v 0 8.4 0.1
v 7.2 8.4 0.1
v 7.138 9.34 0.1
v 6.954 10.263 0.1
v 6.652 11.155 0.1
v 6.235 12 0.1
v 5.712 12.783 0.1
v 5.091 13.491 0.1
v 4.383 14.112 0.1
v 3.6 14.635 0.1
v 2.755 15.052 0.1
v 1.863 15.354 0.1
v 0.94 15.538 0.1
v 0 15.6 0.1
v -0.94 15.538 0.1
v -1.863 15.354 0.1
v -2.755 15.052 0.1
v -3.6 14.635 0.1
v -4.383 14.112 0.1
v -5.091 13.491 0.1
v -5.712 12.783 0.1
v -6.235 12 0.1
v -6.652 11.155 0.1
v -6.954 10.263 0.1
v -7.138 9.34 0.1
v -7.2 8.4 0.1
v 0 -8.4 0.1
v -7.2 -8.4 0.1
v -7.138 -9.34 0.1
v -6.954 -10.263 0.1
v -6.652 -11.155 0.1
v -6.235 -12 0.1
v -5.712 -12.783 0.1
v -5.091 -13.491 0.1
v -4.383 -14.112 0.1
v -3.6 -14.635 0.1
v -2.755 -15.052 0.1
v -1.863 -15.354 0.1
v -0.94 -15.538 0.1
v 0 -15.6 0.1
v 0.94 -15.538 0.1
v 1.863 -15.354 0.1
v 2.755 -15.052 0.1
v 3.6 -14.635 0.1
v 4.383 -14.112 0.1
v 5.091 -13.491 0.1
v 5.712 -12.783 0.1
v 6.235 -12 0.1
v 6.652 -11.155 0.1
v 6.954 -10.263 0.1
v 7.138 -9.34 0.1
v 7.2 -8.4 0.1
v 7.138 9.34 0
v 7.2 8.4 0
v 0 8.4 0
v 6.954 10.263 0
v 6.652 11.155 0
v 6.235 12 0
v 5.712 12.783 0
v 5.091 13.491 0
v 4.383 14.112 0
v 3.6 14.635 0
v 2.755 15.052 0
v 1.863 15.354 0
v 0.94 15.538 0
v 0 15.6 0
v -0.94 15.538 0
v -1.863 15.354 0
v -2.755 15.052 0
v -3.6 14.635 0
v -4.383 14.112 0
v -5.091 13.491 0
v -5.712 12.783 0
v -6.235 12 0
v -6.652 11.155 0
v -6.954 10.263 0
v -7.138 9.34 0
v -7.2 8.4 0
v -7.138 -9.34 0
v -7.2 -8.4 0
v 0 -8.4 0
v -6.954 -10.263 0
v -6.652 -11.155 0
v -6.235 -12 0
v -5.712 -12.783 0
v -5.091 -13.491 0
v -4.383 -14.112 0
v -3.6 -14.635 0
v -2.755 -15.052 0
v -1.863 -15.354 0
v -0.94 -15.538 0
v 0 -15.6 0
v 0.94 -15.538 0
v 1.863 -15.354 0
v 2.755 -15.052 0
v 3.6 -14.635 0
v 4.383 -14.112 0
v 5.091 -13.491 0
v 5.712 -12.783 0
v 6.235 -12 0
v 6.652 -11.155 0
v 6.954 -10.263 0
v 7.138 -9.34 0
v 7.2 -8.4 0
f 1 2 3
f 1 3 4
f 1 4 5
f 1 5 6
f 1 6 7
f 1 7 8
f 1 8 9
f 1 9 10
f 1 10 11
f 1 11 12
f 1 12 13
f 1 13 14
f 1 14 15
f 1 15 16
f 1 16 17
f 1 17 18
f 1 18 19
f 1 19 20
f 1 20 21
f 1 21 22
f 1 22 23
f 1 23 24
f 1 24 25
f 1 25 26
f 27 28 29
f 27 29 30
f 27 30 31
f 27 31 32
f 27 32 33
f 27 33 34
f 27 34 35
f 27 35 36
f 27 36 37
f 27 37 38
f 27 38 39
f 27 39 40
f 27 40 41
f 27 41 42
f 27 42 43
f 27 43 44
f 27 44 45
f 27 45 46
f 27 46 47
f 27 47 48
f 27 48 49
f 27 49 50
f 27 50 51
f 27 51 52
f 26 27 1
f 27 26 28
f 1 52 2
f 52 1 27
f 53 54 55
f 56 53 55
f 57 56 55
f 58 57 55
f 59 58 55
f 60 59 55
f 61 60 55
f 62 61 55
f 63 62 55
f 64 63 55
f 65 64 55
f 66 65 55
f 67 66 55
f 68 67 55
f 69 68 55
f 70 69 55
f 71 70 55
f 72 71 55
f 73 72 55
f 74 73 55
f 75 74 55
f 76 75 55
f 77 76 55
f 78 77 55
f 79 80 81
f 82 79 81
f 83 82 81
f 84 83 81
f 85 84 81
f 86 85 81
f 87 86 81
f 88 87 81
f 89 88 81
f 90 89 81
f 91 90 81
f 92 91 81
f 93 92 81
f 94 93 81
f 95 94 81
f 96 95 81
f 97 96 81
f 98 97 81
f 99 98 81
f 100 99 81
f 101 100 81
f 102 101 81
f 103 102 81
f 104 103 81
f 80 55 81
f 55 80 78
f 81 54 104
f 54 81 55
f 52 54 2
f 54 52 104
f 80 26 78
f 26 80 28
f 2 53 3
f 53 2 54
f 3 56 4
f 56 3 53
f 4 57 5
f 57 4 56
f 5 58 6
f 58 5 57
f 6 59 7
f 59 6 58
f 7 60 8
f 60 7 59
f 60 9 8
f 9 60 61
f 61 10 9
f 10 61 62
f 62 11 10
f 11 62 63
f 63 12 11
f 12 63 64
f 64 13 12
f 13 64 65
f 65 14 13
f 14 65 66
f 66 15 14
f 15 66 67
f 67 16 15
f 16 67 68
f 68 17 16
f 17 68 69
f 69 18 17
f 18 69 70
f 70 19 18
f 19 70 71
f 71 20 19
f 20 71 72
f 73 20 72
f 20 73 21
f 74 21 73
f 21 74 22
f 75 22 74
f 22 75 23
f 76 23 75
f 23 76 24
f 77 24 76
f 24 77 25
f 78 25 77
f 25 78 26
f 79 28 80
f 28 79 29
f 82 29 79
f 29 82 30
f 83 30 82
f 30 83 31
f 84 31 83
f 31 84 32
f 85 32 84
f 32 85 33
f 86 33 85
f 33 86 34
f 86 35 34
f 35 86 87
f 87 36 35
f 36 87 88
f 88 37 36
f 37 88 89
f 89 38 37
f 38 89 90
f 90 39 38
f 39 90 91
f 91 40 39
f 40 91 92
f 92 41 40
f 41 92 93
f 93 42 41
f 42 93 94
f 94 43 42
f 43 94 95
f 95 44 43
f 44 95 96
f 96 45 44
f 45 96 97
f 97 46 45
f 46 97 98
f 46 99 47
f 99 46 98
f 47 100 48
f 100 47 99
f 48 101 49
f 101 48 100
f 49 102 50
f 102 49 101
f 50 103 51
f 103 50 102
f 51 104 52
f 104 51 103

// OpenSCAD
// file: ../p/4-4edge.scad
use <../lib.scad>
$fa=1; $fs=0.2;
function ldraw_lib__4_4edge(realsolid=false) = [
// 0 Circle 1.0
// 0 Name: 4-4edge.dat
// 0 Author: James Jessiman
// 0 !LDRAW_ORG Primitive UPDATE 2017-01
// 0 !LICENSE Licensed under CC BY 2.0 and CC BY 4.0 : see CAreadme.txt
// 
// 0 BFC CERTIFY CCW
  [0,"BFC","CERTIFY"],
  [0,"BFC","CCW"],
// 
// 0 !HISTORY 1998-12-15 [PTadmin] Official Update 1998-10
// 0 !HISTORY 2005-12-28 [PTadmin] Official Update 2005-01
// 0 !HISTORY 2007-06-24 [PTadmin] Header formatted for Contributor Agreement
// 0 !HISTORY 2008-07-01 [PTadmin] Official Update 2008-01
// 0 !HISTORY 2017-01-15 [Steffen] BFCed
// 0 !HISTORY 2017-12-30 [PTadmin] Official Update 2017-01
// 
// 
// 2 24 1 0 0 0.9239 0 0.3827
  [2,24,1,0,0,0.9239,0,0.3827],
// 2 24 0.9239 0 0.3827 0.7071 0 0.7071
  [2,24,0.9239,0,0.3827,0.7071,0,0.7071],
// 2 24 0.7071 0 0.7071 0.3827 0 0.9239
  [2,24,0.7071,0,0.7071,0.3827,0,0.9239],
// 2 24 0.3827 0 0.9239 0 0 1
  [2,24,0.3827,0,0.9239,0,0,1],
// 2 24 0 0 1 -0.3827 0 0.9239
  [2,24,0,0,1,-0.3827,0,0.9239],
// 2 24 -0.3827 0 0.9239 -0.7071 0 0.7071
  [2,24,-0.3827,0,0.9239,-0.7071,0,0.7071],
// 2 24 -0.7071 0 0.7071 -0.9239 0 0.3827
  [2,24,-0.7071,0,0.7071,-0.9239,0,0.3827],
// 2 24 -0.9239 0 0.3827 -1 0 -0
  [2,24,-0.9239,0,0.3827,-1,0,-0],
// 2 24 -1 0 -0 -0.9239 0 -0.3827
  [2,24,-1,0,-0,-0.9239,0,-0.3827],
// 2 24 -0.9239 0 -0.3827 -0.7071 0 -0.7071
  [2,24,-0.9239,0,-0.3827,-0.7071,0,-0.7071],
// 2 24 -0.7071 0 -0.7071 -0.3827 0 -0.9239
  [2,24,-0.7071,0,-0.7071,-0.3827,0,-0.9239],
// 2 24 -0.3827 0 -0.9239 0 0 -1
  [2,24,-0.3827,0,-0.9239,0,0,-1],
// 2 24 0 0 -1 0.3827 0 -0.9239
  [2,24,0,0,-1,0.3827,0,-0.9239],
// 2 24 0.3827 0 -0.9239 0.7071 0 -0.7071
  [2,24,0.3827,0,-0.9239,0.7071,0,-0.7071],
// 2 24 0.7071 0 -0.7071 0.9239 0 -0.3827
  [2,24,0.7071,0,-0.7071,0.9239,0,-0.3827],
// 2 24 0.9239 0 -0.3827 1 0 0
  [2,24,0.9239,0,-0.3827,1,0,0],
];
module ldraw_lib__4_4edge(step=0, col=false, unit=2/5, alt=false, line=0.2, solid=!$preview)
    makepoly(ldraw_lib__4_4edge(solid), step=step, col=col, unit=unit, alt=alt, line=line, solid=solid);
ldraw_lib__4_4edge(line=0.2);
// file: ../p/4-4disc.scad
use <../lib.scad>
$fa=1; $fs=0.2;
function ldraw_lib__4_4disc(realsolid=false) = [
// 0 Disc 1.0
// 0 Name: 4-4disc.dat
// 0 Author: James Jessiman
// 0 !LDRAW_ORG Primitive UPDATE 2002-02
// 0 !LICENSE Licensed under CC BY 2.0 and CC BY 4.0 : see CAreadme.txt
// 
// 0 BFC CERTIFY CCW
  [0,"BFC","CERTIFY"],
  [0,"BFC","CCW"],
// 
// 0 !HISTORY 1998-12-15 [PTadmin] Official Update 1998-10
// 0 !HISTORY 2002-03-23 [sbliss] Added BFC statement
// 0 !HISTORY 2002-04-25 [PTadmin] Official Update 2002-02
// 0 !HISTORY 2007-06-24 [PTadmin] Header formatted for Contributor Agreement
// 0 !HISTORY 2008-07-01 [PTadmin] Official Update 2008-01
// 
// 
// 3 16 0 0 0 1 0 0 0.9239 0 0.3827
  [3,16,0,0,0,1,0,0,0.9239,0,0.3827],
// 3 16 0 0 0 0.9239 0 0.3827 0.7071 0 0.7071
  [3,16,0,0,0,0.9239,0,0.3827,0.7071,0,0.7071],
// 3 16 0 0 0 0.7071 0 0.7071 0.3827 0 0.9239
  [3,16,0,0,0,0.7071,0,0.7071,0.3827,0,0.9239],
// 3 16 0 0 0 0.3827 0 0.9239 0 0 1
  [3,16,0,0,0,0.3827,0,0.9239,0,0,1],
// 3 16 0 0 0 0 0 1 -0.3827 0 0.9239
  [3,16,0,0,0,0,0,1,-0.3827,0,0.9239],
// 3 16 0 0 0 -0.3827 0 0.9239 -0.7071 0 0.7071
  [3,16,0,0,0,-0.3827,0,0.9239,-0.7071,0,0.7071],
// 3 16 0 0 0 -0.7071 0 0.7071 -0.9239 0 0.3827
  [3,16,0,0,0,-0.7071,0,0.7071,-0.9239,0,0.3827],
// 3 16 0 0 0 -0.9239 0 0.3827 -1 0 -0
  [3,16,0,0,0,-0.9239,0,0.3827,-1,0,-0],
// 3 16 0 0 0 -1 0 -0 -0.9239 0 -0.3827
  [3,16,0,0,0,-1,0,-0,-0.9239,0,-0.3827],
// 3 16 0 0 0 -0.9239 0 -0.3827 -0.7071 0 -0.7071
  [3,16,0,0,0,-0.9239,0,-0.3827,-0.7071,0,-0.7071],
// 3 16 0 0 0 -0.7071 0 -0.7071 -0.3827 0 -0.9239
  [3,16,0,0,0,-0.7071,0,-0.7071,-0.3827,0,-0.9239],
// 3 16 0 0 0 -0.3827 0 -0.9239 0 0 -1
  [3,16,0,0,0,-0.3827,0,-0.9239,0,0,-1],
// 3 16 0 0 0 0 0 -1 0.3827 0 -0.9239
  [3,16,0,0,0,0,0,-1,0.3827,0,-0.9239],
// 3 16 0 0 0 0.3827 0 -0.9239 0.7071 0 -0.7071
  [3,16,0,0,0,0.3827,0,-0.9239,0.7071,0,-0.7071],
// 3 16 0 0 0 0.7071 0 -0.7071 0.9239 0 -0.3827
  [3,16,0,0,0,0.7071,0,-0.7071,0.9239,0,-0.3827],
// 3 16 0 0 0 0.9239 0 -0.3827 1 0 0
  [3,16,0,0,0,0.9239,0,-0.3827,1,0,0],
// 0
];
module ldraw_lib__4_4disc(step=0, col=false, unit=2/5, alt=false, line=0.2, solid=!$preview)
    makepoly(ldraw_lib__4_4disc(solid), step=step, col=col, unit=unit, alt=alt, line=line, solid=solid);
ldraw_lib__4_4disc(line=0.2);
// file: ../p/4-4cyli.scad
use <../lib.scad>
$fa=1; $fs=0.2;
function ldraw_lib__4_4cyli(realsolid=false) = [
// 0 Cylinder 1.0
// 0 Name: 4-4cyli.dat
// 0 Author: James Jessiman
// 0 !LDRAW_ORG Primitive UPDATE 2005-01
// 0 !LICENSE Licensed under CC BY 2.0 and CC BY 4.0 : see CAreadme.txt
// 
// 0 BFC CERTIFY CCW
  [0,"BFC","CERTIFY"],
  [0,"BFC","CCW"],
// 
// 0 !HISTORY 1998-12-15 [PTadmin] Official Update 1998-10
// 0 !HISTORY 2002-03-23 [sbliss] Added BFC statement; merged headers from files in distributions LDraw 0.27 and Complete.
// 0 !HISTORY 2002-04-25 [PTadmin] Official Update 2002-02
// 0 !HISTORY 2004-12-14 [guyvivan] BFC CCW
// 0 !HISTORY 2005-12-28 [PTadmin] Official Update 2005-01
// 0 !HISTORY 2007-06-24 [PTadmin] Header formatted for Contributor Agreement
// 0 !HISTORY 2008-07-01 [PTadmin] Official Update 2008-01
// 
// 
// 4 16 1 1 0 0.9239 1 0.3827 0.9239 0 0.3827 1 0 0
  [4,16,1,1,0,0.9239,1,0.3827,0.9239,0,0.3827,1,0,0],
// 5 24 1 0 0 1 1 0 0.9239 0 0.3827 0.9239 0 -0.3827
  [5,24,1,0,0,1,1,0,0.9239,0,0.3827,0.9239,0,-0.3827],
// 4 16 0.9239 1 0.3827 0.7071 1 0.7071 0.7071 0 0.7071 0.9239 0 0.3827
  [4,16,0.9239,1,0.3827,0.7071,1,0.7071,0.7071,0,0.7071,0.9239,0,0.3827],
// 5 24 0.9239 0 0.3827 0.9239 1 0.3827 0.7071 0 0.7071 1 0 0
  [5,24,0.9239,0,0.3827,0.9239,1,0.3827,0.7071,0,0.7071,1,0,0],
// 4 16 0.7071 1 0.7071 0.3827 1 0.9239 0.3827 0 0.9239 0.7071 0 0.7071
  [4,16,0.7071,1,0.7071,0.3827,1,0.9239,0.3827,0,0.9239,0.7071,0,0.7071],
// 5 24 0.7071 0 0.7071 0.7071 1 0.7071 0.3827 0 0.9239 0.9239 0 0.3827
  [5,24,0.7071,0,0.7071,0.7071,1,0.7071,0.3827,0,0.9239,0.9239,0,0.3827],
// 4 16 0.3827 1 0.9239 0 1 1 0 0 1 0.3827 0 0.9239
  [4,16,0.3827,1,0.9239,0,1,1,0,0,1,0.3827,0,0.9239],
// 5 24 0.3827 0 0.9239 0.3827 1 0.9239 0 0 1 0.7071 0 0.7071
  [5,24,0.3827,0,0.9239,0.3827,1,0.9239,0,0,1,0.7071,0,0.7071],
// 4 16 0 1 1 -0.3827 1 0.9239 -0.3827 0 0.9239 0 0 1
  [4,16,0,1,1,-0.3827,1,0.9239,-0.3827,0,0.9239,0,0,1],
// 5 24 0 0 1 0 1 1 -0.3827 0 0.9239 0.3827 0 0.9239
  [5,24,0,0,1,0,1,1,-0.3827,0,0.9239,0.3827,0,0.9239],
// 4 16 -0.3827 1 0.9239 -0.7071 1 0.7071 -0.7071 0 0.7071 -0.3827 0 0.9239
  [4,16,-0.3827,1,0.9239,-0.7071,1,0.7071,-0.7071,0,0.7071,-0.3827,0,0.9239],
// 5 24 -0.3827 0 0.9239 -0.3827 1 0.9239 -0.7071 0 0.7071 0 0 1
  [5,24,-0.3827,0,0.9239,-0.3827,1,0.9239,-0.7071,0,0.7071,0,0,1],
// 4 16 -0.7071 1 0.7071 -0.9239 1 0.3827 -0.9239 0 0.3827 -0.7071 0 0.7071
  [4,16,-0.7071,1,0.7071,-0.9239,1,0.3827,-0.9239,0,0.3827,-0.7071,0,0.7071],
// 5 24 -0.7071 0 0.7071 -0.7071 1 0.7071 -0.9239 0 0.3827 -0.3827 0 0.9239
  [5,24,-0.7071,0,0.7071,-0.7071,1,0.7071,-0.9239,0,0.3827,-0.3827,0,0.9239],
// 4 16 -0.9239 1 0.3827 -1 1 0 -1 0 0 -0.9239 0 0.3827
  [4,16,-0.9239,1,0.3827,-1,1,0,-1,0,0,-0.9239,0,0.3827],
// 5 24 -0.9239 0 0.3827 -0.9239 1 0.3827 -1 0 0 -0.7071 0 0.7071
  [5,24,-0.9239,0,0.3827,-0.9239,1,0.3827,-1,0,0,-0.7071,0,0.7071],
// 4 16 -1 1 0 -0.9239 1 -0.3827 -0.9239 0 -0.3827 -1 0 0
  [4,16,-1,1,0,-0.9239,1,-0.3827,-0.9239,0,-0.3827,-1,0,0],
// 5 24 -1 0 0 -1 1 0 -0.9239 0 -0.3827 -0.9239 0 0.3827
  [5,24,-1,0,0,-1,1,0,-0.9239,0,-0.3827,-0.9239,0,0.3827],
// 4 16 -0.9239 1 -0.3827 -0.7071 1 -0.7071 -0.7071 0 -0.7071 -0.9239 0 -0.3827
  [4,16,-0.9239,1,-0.3827,-0.7071,1,-0.7071,-0.7071,0,-0.7071,-0.9239,0,-0.3827],
// 5 24 -0.9239 0 -0.3827 -0.9239 1 -0.3827 -0.7071 0 -0.7071 -1 0 0
  [5,24,-0.9239,0,-0.3827,-0.9239,1,-0.3827,-0.7071,0,-0.7071,-1,0,0],
// 4 16 -0.7071 1 -0.7071 -0.3827 1 -0.9239 -0.3827 0 -0.9239 -0.7071 0 -0.7071
  [4,16,-0.7071,1,-0.7071,-0.3827,1,-0.9239,-0.3827,0,-0.9239,-0.7071,0,-0.7071],
// 5 24 -0.7071 0 -0.7071 -0.7071 1 -0.7071 -0.3827 0 -0.9239 -0.9239 0 -0.3827
  [5,24,-0.7071,0,-0.7071,-0.7071,1,-0.7071,-0.3827,0,-0.9239,-0.9239,0,-0.3827],
// 4 16 -0.3827 1 -0.9239 0 1 -1 0 0 -1 -0.3827 0 -0.9239
  [4,16,-0.3827,1,-0.9239,0,1,-1,0,0,-1,-0.3827,0,-0.9239],
// 5 24 -0.3827 0 -0.9239 -0.3827 1 -0.9239 0 0 -1 -0.7071 0 -0.7071
  [5,24,-0.3827,0,-0.9239,-0.3827,1,-0.9239,0,0,-1,-0.7071,0,-0.7071],
// 4 16 0 1 -1 0.3827 1 -0.9239 0.3827 0 -0.9239 0 0 -1
  [4,16,0,1,-1,0.3827,1,-0.9239,0.3827,0,-0.9239,0,0,-1],
// 5 24 0 0 -1 0 1 -1 0.3827 0 -0.9239 -0.3827 0 -0.9239
  [5,24,0,0,-1,0,1,-1,0.3827,0,-0.9239,-0.3827,0,-0.9239],
// 4 16 0.3827 1 -0.9239 0.7071 1 -0.7071 0.7071 0 -0.7071 0.3827 0 -0.9239
  [4,16,0.3827,1,-0.9239,0.7071,1,-0.7071,0.7071,0,-0.7071,0.3827,0,-0.9239],
// 5 24 0.3827 0 -0.9239 0.3827 1 -0.9239 0.7071 0 -0.7071 0 0 -1
  [5,24,0.3827,0,-0.9239,0.3827,1,-0.9239,0.7071,0,-0.7071,0,0,-1],
// 4 16 0.7071 1 -0.7071 0.9239 1 -0.3827 0.9239 0 -0.3827 0.7071 0 -0.7071
  [4,16,0.7071,1,-0.7071,0.9239,1,-0.3827,0.9239,0,-0.3827,0.7071,0,-0.7071],
// 5 24 0.7071 0 -0.7071 0.7071 1 -0.7071 0.9239 0 -0.3827 0.3827 0 -0.9239
  [5,24,0.7071,0,-0.7071,0.7071,1,-0.7071,0.9239,0,-0.3827,0.3827,0,-0.9239],
// 4 16 0.9239 1 -0.3827 1 1 0 1 0 0 0.9239 0 -0.3827
  [4,16,0.9239,1,-0.3827,1,1,0,1,0,0,0.9239,0,-0.3827],
// 5 24 0.9239 0 -0.3827 0.9239 1 -0.3827 1 0 0 0.7071 0 -0.7071
  [5,24,0.9239,0,-0.3827,0.9239,1,-0.3827,1,0,0,0.7071,0,-0.7071],
// 0
];
module ldraw_lib__4_4cyli(step=0, col=false, unit=2/5, alt=false, line=0.2, solid=!$preview)
    makepoly(ldraw_lib__4_4cyli(solid), step=step, col=col, unit=unit, alt=alt, line=line, solid=solid);
ldraw_lib__4_4cyli(line=0.2);
// file: ../p/stud3.scad
use <../lib.scad>
use <4-4cyli.scad>
use <4-4disc.scad>
use <4-4edge.scad>
$fa=1; $fs=0.2;
function ldraw_lib__stud3(realsolid=false) = realsolid ? 
    [openscad(translate([0,0,-eps()], o=cylinder(4+eps(), r=4)),2)] : [
// 0 Stud Tube Solid
// 0 Name: stud3.dat
// 0 Author: James Jessiman
// 0 !LDRAW_ORG Primitive UPDATE 2012-01
// 0 !LICENSE Licensed under CC BY 2.0 and CC BY 4.0 : see CAreadme.txt
// 
// 0 BFC CERTIFY CCW
  [0,"BFC","CERTIFY"],
  [0,"BFC","CCW"],
// 
// 0 !HISTORY 2002-04-04 [sbliss] Modified for BFC compliance
// 0 !HISTORY 2002-04-25 [PTadmin] Official Update 2002-02
// 0 !HISTORY 2007-06-24 [PTadmin] Header formatted for Contributor Agreement
// 0 !HISTORY 2008-07-01 [PTadmin] Official Update 2008-01
// 0 !HISTORY 2012-02-16 [Philo] Changed to CCW
// 0 !HISTORY 2012-03-30 [PTadmin] Official Update 2012-01
// 
// 
// 1 16 0 -4 0 4 0 0 0 1 0 0 0 4 4-4edge.dat
  [1,16,0,-4,0,4,0,0,0,1,0,0,0,4, ldraw_lib__4_4edge(realsolid)],
// 1 16 0 0 0 4 0 0 0 1 0 0 0 4 4-4edge.dat
  [1,16,0,0,0,4,0,0,0,1,0,0,0,4, ldraw_lib__4_4edge(realsolid)],
// 1 16 0 -4 0 4 0 0 0 1 0 0 0 4 4-4disc.dat
  [1,16,0,-4,0,4,0,0,0,1,0,0,0,4, ldraw_lib__4_4disc(realsolid)],
// 1 16 0 -4 0 4 0 0 0 4 0 0 0 4 4-4cyli.dat
  [1,16,0,-4,0,4,0,0,0,4,0,0,0,4, ldraw_lib__4_4cyli(realsolid)],
];
module ldraw_lib__stud3(step=0, col=false, unit=2/5, alt=false, line=0.2, solid=!$preview)
    makepoly(ldraw_lib__stud3(solid), step=step, col=col, unit=unit, alt=alt, line=line, solid=solid);
ldraw_lib__stud3(line=0.2);
// file: ../p/stud.scad
use <../lib.scad>
use <4-4cyli.scad>
use <4-4disc.scad>
use <4-4edge.scad>
$fa=1; $fs=0.2;
function ldraw_lib__stud(realsolid=false) = realsolid ? 
    [openscad(translate([0,0,-eps()], o=cylinder(4+eps(), r=6)),2)] : [
// 0 Stud
// 0 Name: stud.dat
// 0 Author: James Jessiman
// 0 !LDRAW_ORG Primitive UPDATE 2012-01
// 0 !LICENSE Licensed under CC BY 2.0 and CC BY 4.0 : see CAreadme.txt
// 
// 0 BFC CERTIFY CCW
  [0,"BFC","CERTIFY"],
  [0,"BFC","CCW"],
// 
// 0 !HISTORY 2002-04-04 [sbliss] Modified for BFC compliance
// 0 !HISTORY 2002-04-25 [PTadmin] Official Update 2002-02
// 0 !HISTORY 2007-06-24 [PTadmin] Header formatted for Contributor Agreement
// 0 !HISTORY 2008-07-01 [PTadmin] Official Update 2008-01
// 0 !HISTORY 2012-02-16 [Philo] Changed to CCW
// 0 !HISTORY 2012-03-30 [PTadmin] Official Update 2012-01
// 
// 
// 1 16 0 0 0 6 0 0 0 1 0 0 0 6 4-4edge.dat
  [1,16,0,0,0,6,0,0,0,1,0,0,0,6, ldraw_lib__4_4edge(realsolid)],
// 1 16 0 -4 0 6 0 0 0 1 0 0 0 6 4-4edge.dat
  [1,16,0,-4,0,6,0,0,0,1,0,0,0,6, ldraw_lib__4_4edge(realsolid)],
// 1 16 0 0 0 6 0 0 0 -4 0 0 0 6 4-4cyli.dat
  [1,16,0,0,0,6,0,0,0,-4,0,0,0,6, ldraw_lib__4_4cyli(realsolid)],
// 1 16 0 -4 0 6 0 0 0 1 0 0 0 6 4-4disc.dat
  [1,16,0,-4,0,6,0,0,0,1,0,0,0,6, ldraw_lib__4_4disc(realsolid)],
];
module ldraw_lib__stud(step=0, col=false, unit=2/5, alt=false, line=0.2, solid=!$preview)
    makepoly(ldraw_lib__stud(solid), step=step, col=col, unit=unit, alt=alt, line=line, solid=solid);
ldraw_lib__stud(line=0.2);
// file: ../p/box5.scad
use <../lib.scad>
$fa=1; $fs=0.2;
function ldraw_lib__box5(realsolid=false) = [
// 0 Box with 5 Faces and All Edges
// 0 Name: box5.dat
// 0 Author: James Jessiman
// 0 !LDRAW_ORG Primitive UPDATE 2012-01
// 0 !LICENSE Licensed under CC BY 2.0 and CC BY 4.0 : see CAreadme.txt
// 
// 0 BFC CERTIFY CCW
  [0,"BFC","CERTIFY"],
  [0,"BFC","CCW"],
// 
// 0 !HISTORY 2002-04-03 [sbliss] Modified for BFC compliance
// 0 !HISTORY 2002-04-25 [PTadmin] Official Update 2002-02
// 0 !HISTORY 2007-06-24 [PTadmin] Header formatted for Contributor Agreement
// 0 !HISTORY 2008-07-01 [PTadmin] Official Update 2008-01
// 0 !HISTORY 2012-02-16 [Philo] Changed to CCW
// 0 !HISTORY 2012-03-30 [PTadmin] Official Update 2012-01
// 
// 
// 2 24 1 1 1 -1 1 1
  [2,24,1,1,1,-1,1,1],
// 2 24 -1 1 1 -1 1 -1
  [2,24,-1,1,1,-1,1,-1],
// 2 24 -1 1 -1 1 1 -1
  [2,24,-1,1,-1,1,1,-1],
// 2 24 1 1 -1 1 1 1
  [2,24,1,1,-1,1,1,1],
// 2 24 1 0 1 -1 0 1
  [2,24,1,0,1,-1,0,1],
// 2 24 -1 0 1 -1 0 -1
  [2,24,-1,0,1,-1,0,-1],
// 2 24 -1 0 -1 1 0 -1
  [2,24,-1,0,-1,1,0,-1],
// 2 24 1 0 -1 1 0 1
  [2,24,1,0,-1,1,0,1],
// 2 24 1 0 1 1 1 1
  [2,24,1,0,1,1,1,1],
// 2 24 -1 0 1 -1 1 1
  [2,24,-1,0,1,-1,1,1],
// 2 24 1 0 -1 1 1 -1
  [2,24,1,0,-1,1,1,-1],
// 2 24 -1 0 -1 -1 1 -1
  [2,24,-1,0,-1,-1,1,-1],
// 4 16 -1 1 1 1 1 1 1 1 -1 -1 1 -1
  [4,16,-1,1,1,1,1,1,1,1,-1,-1,1,-1],
// 4 16 -1 1 1 -1 0 1 1 0 1 1 1 1
  [4,16,-1,1,1,-1,0,1,1,0,1,1,1,1],
// 4 16 -1 1 -1 -1 0 -1 -1 0 1 -1 1 1
  [4,16,-1,1,-1,-1,0,-1,-1,0,1,-1,1,1],
// 4 16 1 1 -1 1 0 -1 -1 0 -1 -1 1 -1
  [4,16,1,1,-1,1,0,-1,-1,0,-1,-1,1,-1],
// 4 16 1 1 1 1 0 1 1 0 -1 1 1 -1
  [4,16,1,1,1,1,0,1,1,0,-1,1,1,-1],
];
module ldraw_lib__box5(step=0, col=false, unit=2/5, alt=false, line=0.2, solid=!$preview)
    makepoly(ldraw_lib__box5(solid), step=step, col=col, unit=unit, alt=alt, line=line, solid=solid);
ldraw_lib__box5(line=0.2);
// file: ../p/box4t.scad
use <../lib.scad>
$fa=1; $fs=0.2;
function ldraw_lib__box4t(realsolid=false) = [
// 0 Box with 4 Adjacent Faces and All Edges
// 0 Name: box4t.dat
// 0 Author: Tore Eriksson [Tore_Eriksson]
// 0 !LDRAW_ORG Primitive UPDATE 2003-02
// 0 !LICENSE Licensed under CC BY 2.0 and CC BY 4.0 : see CAreadme.txt
// 
// 0 BFC CERTIFY CCW
  [0,"BFC","CERTIFY"],
  [0,"BFC","CCW"],
// 
// 0 !HISTORY 1997-09-29 [PTadmin] Official Update 1997-15
// 0 !HISTORY 2002-08-31 [izanette] Modified with WINDZ for BFC compliance
// 0 !HISTORY 2003-08-01 [PTadmin] Official Update 2003-02
// 0 !HISTORY 2007-06-24 [PTadmin] Header formatted for Contributor Agreement
// 0 !HISTORY 2008-07-01 [PTadmin] Official Update 2008-01
// 
// 
// 2 24 1 1 1 -1 1 1
  [2,24,1,1,1,-1,1,1],
// 2 24 -1 1 1 -1 1 -1
  [2,24,-1,1,1,-1,1,-1],
// 2 24 -1 1 -1 1 1 -1
  [2,24,-1,1,-1,1,1,-1],
// 2 24 1 1 -1 1 1 1
  [2,24,1,1,-1,1,1,1],
// 2 24 1 0 1 -1 0 1
  [2,24,1,0,1,-1,0,1],
// 2 24 -1 0 1 -1 0 -1
  [2,24,-1,0,1,-1,0,-1],
// 2 24 -1 0 -1 1 0 -1
  [2,24,-1,0,-1,1,0,-1],
// 2 24 1 0 -1 1 0 1
  [2,24,1,0,-1,1,0,1],
// 2 24 1 0 1 1 1 1
  [2,24,1,0,1,1,1,1],
// 2 24 -1 0 1 -1 1 1
  [2,24,-1,0,1,-1,1,1],
// 2 24 1 0 -1 1 1 -1
  [2,24,1,0,-1,1,1,-1],
// 2 24 -1 0 -1 -1 1 -1
  [2,24,-1,0,-1,-1,1,-1],
// 4 16 1 1 1 1 1 -1 -1 1 -1 -1 1 1
  [4,16,1,1,1,1,1,-1,-1,1,-1,-1,1,1],
// 4 16 1 1 1 -1 1 1 -1 0 1 1 0 1
  [4,16,1,1,1,-1,1,1,-1,0,1,1,0,1],
// 4 16 -1 1 1 -1 1 -1 -1 0 -1 -1 0 1
  [4,16,-1,1,1,-1,1,-1,-1,0,-1,-1,0,1],
// 0 4 16 -1 1 -1 -1 0 -1 1 0 -1 1 1 -1
// 4 16 1 1 -1 1 1 1 1 0 1 1 0 -1
  [4,16,1,1,-1,1,1,1,1,0,1,1,0,-1],
// 0
];
module ldraw_lib__box4t(step=0, col=false, unit=2/5, alt=false, line=0.2, solid=!$preview)
    makepoly(ldraw_lib__box4t(solid), step=step, col=col, unit=unit, alt=alt, line=line, solid=solid);
ldraw_lib__box4t(line=0.2);
// file: s/3004s01.scad
use <../../lib.scad>
use <../../p/box4t.scad>
use <../../p/box5.scad>
use <../../p/stud.scad>
use <../../p/stud3.scad>
$fa=1; $fs=0.2;
function ldraw_lib__s__3004s01(realsolid=false) = [
// 0 ~Brick  1 x  2 without Front Face
// 0 Name: s\3004s01.dat
// 0 Author: James Jessiman
// 0 !LDRAW_ORG Subpart UPDATE 2003-03
// 0 !LICENSE Licensed under CC BY 2.0 and CC BY 4.0 : see CAreadme.txt
// 
// 0 BFC CERTIFY CCW
  [0,"BFC","CERTIFY"],
  [0,"BFC","CCW"],
// 
// 0 !HISTORY 2003-09-07 [jriley] Subfiling, BFC
// 0 !HISTORY 2003-12-19 [PTadmin] Official Update 2003-03
// 0 !HISTORY 2007-08-29 [PTadmin] Header formatted for Contributor Agreement
// 0 !HISTORY 2008-07-01 [PTadmin] Official Update 2008-01
// 
// 
// 1 16 0 4 0 1 0 0 0 -5 0 0 0 1 stud3.dat
  [1,16,0,4,0,1,0,0,0,-5,0,0,0,1, ldraw_lib__stud3(realsolid)],
// 0 BFC INVERTNEXT
  [0,"BFC","INVERTNEXT"],
// 1 16 0 24 0 16 0 0 0 -20 0 0 0 6 box5.dat
  [1,16,0,24,0,16,0,0,0,-20,0,0,0,6, ldraw_lib__box5(realsolid)],
// 4 16 20 24 10 16 24 6 -16 24 6 -20 24 10
  [4,16,20,24,10,16,24,6,-16,24,6,-20,24,10],
// 4 16 -20 24 10 -16 24 6 -16 24 -6 -20 24 -10
  [4,16,-20,24,10,-16,24,6,-16,24,-6,-20,24,-10],
// 4 16 -20 24 -10 -16 24 -6 16 24 -6 20 24 -10
  [4,16,-20,24,-10,-16,24,-6,16,24,-6,20,24,-10],
// 4 16 20 24 -10 16 24 -6 16 24 6 20 24 10
  [4,16,20,24,-10,16,24,-6,16,24,6,20,24,10],
// 1 16 0 24 0 20 0 0 0 -24 0 0 0 10 box4t.dat
  [1,16,0,24,0,20,0,0,0,-24,0,0,0,10, ldraw_lib__box4t(realsolid)],
// 1 16 10 0 0 1 0 0 0 1 0 0 0 1 stud.dat
  [1,16,10,0,0,1,0,0,0,1,0,0,0,1, ldraw_lib__stud(realsolid)],
// 1 16 -10 0 0 1 0 0 0 1 0 0 0 1 stud.dat
  [1,16,-10,0,0,1,0,0,0,1,0,0,0,1, ldraw_lib__stud(realsolid)],
// 0
];
module ldraw_lib__s__3004s01(step=0, col=false, unit=2/5, alt=false, line=0.2, solid=!$preview)
    makepoly(ldraw_lib__s__3004s01(solid), step=step, col=col, unit=unit, alt=alt, line=line, solid=solid);
ldraw_lib__s__3004s01(line=0.2);
// file: 3004.scad
use <../lib.scad>
use <s/3004s01.scad>
$fa=1; $fs=0.2;
function ldraw_lib__3004(realsolid=false) = [
// 0 Brick  1 x  2
// 0 Name: 3004.dat
// 0 Author: James Jessiman
// 0 !LDRAW_ORG Part UPDATE 2022-05
// 0 !LICENSE Licensed under CC BY 2.0 and CC BY 4.0 : see CAreadme.txt
// 
// 0 BFC CERTIFY CCW
  [0,"BFC","CERTIFY"],
  [0,"BFC","CCW"],
// 
// 0 !HISTORY 2001-10-26 [PTadmin] Official Update 2001-01
// 0 !HISTORY 2002-05-07 {unknown} BFC Certification
// 0 !HISTORY 2002-06-11 [PTadmin] Official Update 2002-03
// 0 !HISTORY 2007-05-07 [PTadmin] Header formatted for Contributor Agreement
// 0 !HISTORY 2008-07-01 [PTadmin] Official Update 2008-01
// 0 !HISTORY 2022-08-04 [MagFors] Using subfile
// 0 !HISTORY 2022-09-15 [PTadmin] Official Update 2022-05
// 
// 
// 1 16 0 0 0 1 0 0 0 1 0 0 0 1 s\3004s01.dat
  [1,16,0,0,0,1,0,0,0,1,0,0,0,1, ldraw_lib__s__3004s01(realsolid)],
// 4 16 -20 24 -10 20 24 -10 20 0 -10 -20 0 -10
  [4,16,-20,24,-10,20,24,-10,20,0,-10,-20,0,-10],
];
module ldraw_lib__3004(step=0, col=false, unit=2/5, alt=false, line=0.2, solid=!$preview)
    makepoly(ldraw_lib__3004(solid), step=step, col=col, unit=unit, alt=alt, line=line, solid=solid);
ldraw_lib__3004(line=0.2);
// file: ../p/48/2-4disc.scad
use <../../lib.scad>
$fa=1; $fs=0.2;
function ldraw_lib__48__2_4disc(realsolid=false) = [
// 0 Hi-Res Disc 0.5
// 0 Name: 48\2-4disc.dat
// 0 Author: Niels Bugge [SirBugge]
// 0 !LDRAW_ORG 48_Primitive UPDATE 2009-01
// 0 !LICENSE Licensed under CC BY 2.0 and CC BY 4.0 : see CAreadme.txt
// 
// 0 BFC CERTIFY CCW
  [0,"BFC","CERTIFY"],
  [0,"BFC","CCW"],
// 
// 0 !HISTORY 2009-05-02 [PTadmin] Official Update 2009-01
// 
// 
// 3 16 0 0 0 1 0 0 .9914 0 .1305
  [3,16,0,0,0,1,0,0,.9914,0,.1305],
// 3 16 0 0 0 .9914 0 .1305 .9659 0 .2588
  [3,16,0,0,0,.9914,0,.1305,.9659,0,.2588],
// 3 16 0 0 0 .9659 0 .2588 .9239 0 .3827
  [3,16,0,0,0,.9659,0,.2588,.9239,0,.3827],
// 3 16 0 0 0 .9239 0 .3827 .866 0 .5
  [3,16,0,0,0,.9239,0,.3827,.866,0,.5],
// 3 16 0 0 0 .866 0 .5 .7934 0 .6088
  [3,16,0,0,0,.866,0,.5,.7934,0,.6088],
// 3 16 0 0 0 .7934 0 .6088 .7071 0 .7071
  [3,16,0,0,0,.7934,0,.6088,.7071,0,.7071],
// 3 16 0 0 0 .7071 0 .7071 .6088 0 .7934
  [3,16,0,0,0,.7071,0,.7071,.6088,0,.7934],
// 3 16 0 0 0 .6088 0 .7934 .5 0 .866
  [3,16,0,0,0,.6088,0,.7934,.5,0,.866],
// 3 16 0 0 0 .5 0 .866 .3827 0 .9239
  [3,16,0,0,0,.5,0,.866,.3827,0,.9239],
// 3 16 0 0 0 .3827 0 .9239 .2588 0 .9659
  [3,16,0,0,0,.3827,0,.9239,.2588,0,.9659],
// 3 16 0 0 0 .2588 0 .9659 .1305 0 .9914
  [3,16,0,0,0,.2588,0,.9659,.1305,0,.9914],
// 3 16 0 0 0 .1305 0 .9914 0 0 1
  [3,16,0,0,0,.1305,0,.9914,0,0,1],
// 3 16 0 0 0 0 0 1 -.1305 0 .9914
  [3,16,0,0,0,0,0,1,-.1305,0,.9914],
// 3 16 0 0 0 -.1305 0 .9914 -.2588 0 .9659
  [3,16,0,0,0,-.1305,0,.9914,-.2588,0,.9659],
// 3 16 0 0 0 -.2588 0 .9659 -.3827 0 .9239
  [3,16,0,0,0,-.2588,0,.9659,-.3827,0,.9239],
// 3 16 0 0 0 -.3827 0 .9239 -.5 0 .866
  [3,16,0,0,0,-.3827,0,.9239,-.5,0,.866],
// 3 16 0 0 0 -.5 0 .866 -.6088 0 .7934
  [3,16,0,0,0,-.5,0,.866,-.6088,0,.7934],
// 3 16 0 0 0 -.6088 0 .7934 -.7071 0 .7071
  [3,16,0,0,0,-.6088,0,.7934,-.7071,0,.7071],
// 3 16 0 0 0 -.7071 0 .7071 -.7934 0 .6088
  [3,16,0,0,0,-.7071,0,.7071,-.7934,0,.6088],
// 3 16 0 0 0 -.7934 0 .6088 -.866 0 .5
  [3,16,0,0,0,-.7934,0,.6088,-.866,0,.5],
// 3 16 0 0 0 -.866 0 .5 -.9239 0 .3827
  [3,16,0,0,0,-.866,0,.5,-.9239,0,.3827],
// 3 16 0 0 0 -.9239 0 .3827 -.9659 0 .2588
  [3,16,0,0,0,-.9239,0,.3827,-.9659,0,.2588],
// 3 16 0 0 0 -.9659 0 .2588 -.9914 0 .1305
  [3,16,0,0,0,-.9659,0,.2588,-.9914,0,.1305],
// 3 16 0 0 0 -.9914 0 .1305 -1 0 0
  [3,16,0,0,0,-.9914,0,.1305,-1,0,0],
// 
// 0 end of file
// 
];
module ldraw_lib__48__2_4disc(step=0, col=false, unit=2/5, alt=false, line=0.2, solid=!$preview)
    makepoly(ldraw_lib__48__2_4disc(solid), step=step, col=col, unit=unit, alt=alt, line=line, solid=solid);
ldraw_lib__48__2_4disc(line=0.2);
// file: ../p/48/2-4cyli.scad
use <../../lib.scad>
$fa=1; $fs=0.2;
function ldraw_lib__48__2_4cyli(realsolid=false) = [
// 0 Hi-Res Cylinder 0.5
// 0 Name: 48\2-4cyli.dat
// 0 Author: Guy Vivan [guyvivan]
// 0 !LDRAW_ORG 48_Primitive UPDATE 2009-01
// 0 !LICENSE Licensed under CC BY 2.0 and CC BY 4.0 : see CAreadme.txt
// 
// 0 BFC CERTIFY CCW
  [0,"BFC","CERTIFY"],
  [0,"BFC","CCW"],
// 
// 0 !HISTORY 2009-05-02 [PTadmin] Official Update 2009-01
// 
// 
// 4 16 0.9914 0 0.1305 1 0 0 1 1 0 0.9914 1 0.1305
  [4,16,0.9914,0,0.1305,1,0,0,1,1,0,0.9914,1,0.1305],
// 4 16 0.9659 0 0.2588 0.9914 0 0.1305 0.9914 1 0.1305 0.9659 1 0.2588
  [4,16,0.9659,0,0.2588,0.9914,0,0.1305,0.9914,1,0.1305,0.9659,1,0.2588],
// 4 16 0.9239 0 0.3827 0.9659 0 0.2588 0.9659 1 0.2588 0.9239 1 0.3827
  [4,16,0.9239,0,0.3827,0.9659,0,0.2588,0.9659,1,0.2588,0.9239,1,0.3827],
// 4 16 0.866 0 0.5 0.9239 0 0.3827 0.9239 1 0.3827 0.866 1 0.5
  [4,16,0.866,0,0.5,0.9239,0,0.3827,0.9239,1,0.3827,0.866,1,0.5],
// 4 16 0.7934 0 0.6088 0.866 0 0.5 0.866 1 0.5 0.7934 1 0.6088
  [4,16,0.7934,0,0.6088,0.866,0,0.5,0.866,1,0.5,0.7934,1,0.6088],
// 4 16 0.7071 0 0.7071 0.7934 0 0.6088 0.7934 1 0.6088 0.7071 1 0.7071
  [4,16,0.7071,0,0.7071,0.7934,0,0.6088,0.7934,1,0.6088,0.7071,1,0.7071],
// 4 16 0.6088 0 0.7934 0.7071 0 0.7071 0.7071 1 0.7071 0.6088 1 0.7934
  [4,16,0.6088,0,0.7934,0.7071,0,0.7071,0.7071,1,0.7071,0.6088,1,0.7934],
// 4 16 0.5 0 0.866 0.6088 0 0.7934 0.6088 1 0.7934 0.5 1 0.866
  [4,16,0.5,0,0.866,0.6088,0,0.7934,0.6088,1,0.7934,0.5,1,0.866],
// 4 16 0.3827 0 0.9239 0.5 0 0.866 0.5 1 0.866 0.3827 1 0.9239
  [4,16,0.3827,0,0.9239,0.5,0,0.866,0.5,1,0.866,0.3827,1,0.9239],
// 4 16 0.2588 0 0.9659 0.3827 0 0.9239 0.3827 1 0.9239 0.2588 1 0.9659
  [4,16,0.2588,0,0.9659,0.3827,0,0.9239,0.3827,1,0.9239,0.2588,1,0.9659],
// 4 16 0.1305 0 0.9914 0.2588 0 0.9659 0.2588 1 0.9659 0.1305 1 0.9914
  [4,16,0.1305,0,0.9914,0.2588,0,0.9659,0.2588,1,0.9659,0.1305,1,0.9914],
// 4 16 0 0 1 0.1305 0 0.9914 0.1305 1 0.9914 0 1 1
  [4,16,0,0,1,0.1305,0,0.9914,0.1305,1,0.9914,0,1,1],
// 4 16 -0.1305 0 0.9914 0 0 1 0 1 1 -0.1305 1 0.9914
  [4,16,-0.1305,0,0.9914,0,0,1,0,1,1,-0.1305,1,0.9914],
// 4 16 -0.2588 0 0.9659 -0.1305 0 0.9914 -0.1305 1 0.9914 -0.2588 1 0.9659
  [4,16,-0.2588,0,0.9659,-0.1305,0,0.9914,-0.1305,1,0.9914,-0.2588,1,0.9659],
// 4 16 -0.3827 0 0.9239 -0.2588 0 0.9659 -0.2588 1 0.9659 -0.3827 1 0.9239
  [4,16,-0.3827,0,0.9239,-0.2588,0,0.9659,-0.2588,1,0.9659,-0.3827,1,0.9239],
// 4 16 -0.5 0 0.866 -0.3827 0 0.9239 -0.3827 1 0.9239 -0.5 1 0.866
  [4,16,-0.5,0,0.866,-0.3827,0,0.9239,-0.3827,1,0.9239,-0.5,1,0.866],
// 4 16 -0.6088 0 0.7934 -0.5 0 0.866 -0.5 1 0.866 -0.6088 1 0.7934
  [4,16,-0.6088,0,0.7934,-0.5,0,0.866,-0.5,1,0.866,-0.6088,1,0.7934],
// 4 16 -0.7071 0 0.7071 -0.6088 0 0.7934 -0.6088 1 0.7934 -0.7071 1 0.7071
  [4,16,-0.7071,0,0.7071,-0.6088,0,0.7934,-0.6088,1,0.7934,-0.7071,1,0.7071],
// 4 16 -0.7934 0 0.6088 -0.7071 0 0.7071 -0.7071 1 0.7071 -0.7934 1 0.6088
  [4,16,-0.7934,0,0.6088,-0.7071,0,0.7071,-0.7071,1,0.7071,-0.7934,1,0.6088],
// 4 16 -0.866 0 0.5 -0.7934 0 0.6088 -0.7934 1 0.6088 -0.866 1 0.5
  [4,16,-0.866,0,0.5,-0.7934,0,0.6088,-0.7934,1,0.6088,-0.866,1,0.5],
// 4 16 -0.9239 0 0.3827 -0.866 0 0.5 -0.866 1 0.5 -0.9239 1 0.3827
  [4,16,-0.9239,0,0.3827,-0.866,0,0.5,-0.866,1,0.5,-0.9239,1,0.3827],
// 4 16 -0.9659 0 0.2588 -0.9239 0 0.3827 -0.9239 1 0.3827 -0.9659 1 0.2588
  [4,16,-0.9659,0,0.2588,-0.9239,0,0.3827,-0.9239,1,0.3827,-0.9659,1,0.2588],
// 4 16 -0.9914 0 0.1305 -0.9659 0 0.2588 -0.9659 1 0.2588 -0.9914 1 0.1305
  [4,16,-0.9914,0,0.1305,-0.9659,0,0.2588,-0.9659,1,0.2588,-0.9914,1,0.1305],
// 4 16 -1 0 0 -0.9914 0 0.1305 -0.9914 1 0.1305 -1 1 0
  [4,16,-1,0,0,-0.9914,0,0.1305,-0.9914,1,0.1305,-1,1,0],
// 
// 0 conditional lines
// 5 24 1 1 0 1 0 0 1 1 -1 0.9914 1 0.1305
  [5,24,1,1,0,1,0,0,1,1,-1,0.9914,1,0.1305],
// 5 24 0.9914 1 0.1305 0.9914 0 0.1305 1 1 0 0.9659 1 0.2588
  [5,24,0.9914,1,0.1305,0.9914,0,0.1305,1,1,0,0.9659,1,0.2588],
// 5 24 0.9659 1 0.2588 0.9659 0 0.2588 0.9914 1 0.1305 0.9239 1 0.3827
  [5,24,0.9659,1,0.2588,0.9659,0,0.2588,0.9914,1,0.1305,0.9239,1,0.3827],
// 5 24 0.9239 1 0.3827 0.9239 0 0.3827 0.9659 1 0.2588 0.866 1 0.5
  [5,24,0.9239,1,0.3827,0.9239,0,0.3827,0.9659,1,0.2588,0.866,1,0.5],
// 5 24 0.866 1 0.5 0.866 0 0.5 0.9239 1 0.3827 0.7934 1 0.6088
  [5,24,0.866,1,0.5,0.866,0,0.5,0.9239,1,0.3827,0.7934,1,0.6088],
// 5 24 0.7934 1 0.6088 0.7934 0 0.6088 0.866 1 0.5 0.7071 1 0.7071
  [5,24,0.7934,1,0.6088,0.7934,0,0.6088,0.866,1,0.5,0.7071,1,0.7071],
// 5 24 0.7071 1 0.7071 0.7071 0 0.7071 0.7934 1 0.6088 0.6088 1 0.7934
  [5,24,0.7071,1,0.7071,0.7071,0,0.7071,0.7934,1,0.6088,0.6088,1,0.7934],
// 5 24 0.6088 1 0.7934 0.6088 0 0.7934 0.7071 1 0.7071 0.5 1 0.866
  [5,24,0.6088,1,0.7934,0.6088,0,0.7934,0.7071,1,0.7071,0.5,1,0.866],
// 5 24 0.5 1 0.866 0.5 0 0.866 0.6088 1 0.7934 0.3827 1 0.9239
  [5,24,0.5,1,0.866,0.5,0,0.866,0.6088,1,0.7934,0.3827,1,0.9239],
// 5 24 0.3827 1 0.9239 0.3827 0 0.9239 0.5 1 0.866 0.2588 1 0.9659
  [5,24,0.3827,1,0.9239,0.3827,0,0.9239,0.5,1,0.866,0.2588,1,0.9659],
// 5 24 0.2588 1 0.9659 0.2588 0 0.9659 0.3827 1 0.9239 0.1305 1 0.9914
  [5,24,0.2588,1,0.9659,0.2588,0,0.9659,0.3827,1,0.9239,0.1305,1,0.9914],
// 5 24 0.1305 1 0.9914 0.1305 0 0.9914 0.2588 1 0.9659 0 1 1
  [5,24,0.1305,1,0.9914,0.1305,0,0.9914,0.2588,1,0.9659,0,1,1],
// 5 24 0 1 1 0 0 1 0.1305 1 0.9914 -0.1305 1 0.9914
  [5,24,0,1,1,0,0,1,0.1305,1,0.9914,-0.1305,1,0.9914],
// 5 24 -0.1305 1 0.9914 -0.1305 0 0.9914 0 1 1 -0.2588 1 0.9659
  [5,24,-0.1305,1,0.9914,-0.1305,0,0.9914,0,1,1,-0.2588,1,0.9659],
// 5 24 -0.2588 1 0.9659 -0.2588 0 0.9659 -0.1305 1 0.9914 -0.3827 1 0.9239
  [5,24,-0.2588,1,0.9659,-0.2588,0,0.9659,-0.1305,1,0.9914,-0.3827,1,0.9239],
// 5 24 -0.3827 1 0.9239 -0.3827 0 0.9239 -0.2588 1 0.9659 -0.5 1 0.866
  [5,24,-0.3827,1,0.9239,-0.3827,0,0.9239,-0.2588,1,0.9659,-0.5,1,0.866],
// 5 24 -0.5 1 0.866 -0.5 0 0.866 -0.3827 1 0.9239 -0.6088 1 0.7934
  [5,24,-0.5,1,0.866,-0.5,0,0.866,-0.3827,1,0.9239,-0.6088,1,0.7934],
// 5 24 -0.6088 1 0.7934 -0.6088 0 0.7934 -0.5 1 0.866 -0.7071 1 0.7071
  [5,24,-0.6088,1,0.7934,-0.6088,0,0.7934,-0.5,1,0.866,-0.7071,1,0.7071],
// 5 24 -0.7071 1 0.7071 -0.7071 0 0.7071 -0.6088 1 0.7934 -0.7934 1 0.6088
  [5,24,-0.7071,1,0.7071,-0.7071,0,0.7071,-0.6088,1,0.7934,-0.7934,1,0.6088],
// 5 24 -0.7934 1 0.6088 -0.7934 0 0.6088 -0.7071 1 0.7071 -0.866 1 0.5
  [5,24,-0.7934,1,0.6088,-0.7934,0,0.6088,-0.7071,1,0.7071,-0.866,1,0.5],
// 5 24 -0.866 1 0.5 -0.866 0 0.5 -0.7934 1 0.6088 -0.9239 1 0.3827
  [5,24,-0.866,1,0.5,-0.866,0,0.5,-0.7934,1,0.6088,-0.9239,1,0.3827],
// 5 24 -0.9239 1 0.3827 -0.9239 0 0.3827 -0.866 1 0.5 -0.9659 1 0.2588
  [5,24,-0.9239,1,0.3827,-0.9239,0,0.3827,-0.866,1,0.5,-0.9659,1,0.2588],
// 5 24 -0.9659 1 0.2588 -0.9659 0 0.2588 -0.9239 1 0.3827 -0.9914 1 0.1305
  [5,24,-0.9659,1,0.2588,-0.9659,0,0.2588,-0.9239,1,0.3827,-0.9914,1,0.1305],
// 5 24 -0.9914 1 0.1305 -0.9914 0 0.1305 -0.9659 1 0.2588 -1 1 0
  [5,24,-0.9914,1,0.1305,-0.9914,0,0.1305,-0.9659,1,0.2588,-1,1,0],
// 5 24 -1 1 0 -1 0 0 -0.9914 1 0.1305 -1 1 -1
  [5,24,-1,1,0,-1,0,0,-0.9914,1,0.1305,-1,1,-1],
// 
// 0 end of file
];
module ldraw_lib__48__2_4cyli(step=0, col=false, unit=2/5, alt=false, line=0.2, solid=!$preview)
    makepoly(ldraw_lib__48__2_4cyli(solid), step=step, col=col, unit=unit, alt=alt, line=line, solid=solid);
ldraw_lib__48__2_4cyli(line=0.2);
// main file
use <../lib.scad>
use <../p/48/2-4cyli.scad>
use <../p/48/2-4disc.scad>
$fa=1; $fs=0.2;
function ldraw_lib__6337750a(realsolid=false) = [
// 0 Sticker  3.8 x  1.8 Oval with Chrome Silver Background
// 0 Name: 6337750a.dat
// 0 Author: Evert-Jan Boer [ejboer]
// 0 !LDRAW_ORG Part UPDATE 2022-02
// 0 !LICENSE Licensed under CC BY 2.0 and CC BY 4.0 : see CAreadme.txt
// 
// 0 BFC CERTIFY CCW
  [0,"BFC","CERTIFY"],
  [0,"BFC","CCW"],
// 
// 0 !KEYWORDS Set 21326, Winnie the Pooh
// 
// 0 !HISTORY 2022-03-06 [PTadmin] Official Update 2022-02
// 
// 
// 1 383 0 -0.25 21 18 0 0 0 1 0 0 0 18 48\2-4disc.dat
  [1,383,0,-0.25,21,18,0,0,0,1,0,0,0,18, ldraw_lib__48__2_4disc(realsolid)],
// 1 383 0 -.25 -21 -18 0 0 0 1 0 0 0 -18 48\2-4disc.dat
  [1,383,0,-.25,-21,-18,0,0,0,1,0,0,0,-18, ldraw_lib__48__2_4disc(realsolid)],
// 4 383 -18 -.25 -21 0 -.25 -21 0 -.25 21 -18 -.25 21
  [4,383,-18,-.25,-21,0,-.25,-21,0,-.25,21,-18,-.25,21],
// 4 383 0 -.25 -21 18 -.25 -21 18 -.25 21 0 -.25 21
  [4,383,0,-.25,-21,18,-.25,-21,18,-.25,21,0,-.25,21],
// 
// 1 16 0 0 21 18 0 0 0 -1 0 0 0 18 48\2-4disc.dat
  [1,16,0,0,21,18,0,0,0,-1,0,0,0,18, ldraw_lib__48__2_4disc(realsolid)],
// 1 16 0 0 -21 -18 0 0 0 -1 0 0 0 -18 48\2-4disc.dat
  [1,16,0,0,-21,-18,0,0,0,-1,0,0,0,-18, ldraw_lib__48__2_4disc(realsolid)],
// 4 16 0 0 21 0 0 -21 -18 0 -21 -18 0 21
  [4,16,0,0,21,0,0,-21,-18,0,-21,-18,0,21],
// 4 16 18 0 21 18 0 -21 0 0 -21 0 0 21
  [4,16,18,0,21,18,0,-21,0,0,-21,0,0,21],
// 4 16 18 -.25 21 18 -.25 -21 18 0 -21 18 0 21
  [4,16,18,-.25,21,18,-.25,-21,18,0,-21,18,0,21],
// 4 16 -18 -.25 -21 -18 -.25 21 -18 0 21 -18 0 -21
  [4,16,-18,-.25,-21,-18,-.25,21,-18,0,21,-18,0,-21],
// 1 16 0 -0.25 21 18 0 0 0 .25 0 0 0 18 48\2-4cyli.dat
  [1,16,0,-0.25,21,18,0,0,0,.25,0,0,0,18, ldraw_lib__48__2_4cyli(realsolid)],
// 1 16 0 -.25 -21 -18 0 0 0 .25 0 0 0 -18 48\2-4cyli.dat
  [1,16,0,-.25,-21,-18,0,0,0,.25,0,0,0,-18, ldraw_lib__48__2_4cyli(realsolid)],
];
module ldraw_lib__6337750a(step=0, col=false, unit=2/5, alt=false, line=0.2, solid=!$preview)
    makepoly(ldraw_lib__6337750a(solid), step=step, col=col, unit=unit, alt=alt, line=line, solid=solid);
ldraw_lib__6337750a(line=0.2);
